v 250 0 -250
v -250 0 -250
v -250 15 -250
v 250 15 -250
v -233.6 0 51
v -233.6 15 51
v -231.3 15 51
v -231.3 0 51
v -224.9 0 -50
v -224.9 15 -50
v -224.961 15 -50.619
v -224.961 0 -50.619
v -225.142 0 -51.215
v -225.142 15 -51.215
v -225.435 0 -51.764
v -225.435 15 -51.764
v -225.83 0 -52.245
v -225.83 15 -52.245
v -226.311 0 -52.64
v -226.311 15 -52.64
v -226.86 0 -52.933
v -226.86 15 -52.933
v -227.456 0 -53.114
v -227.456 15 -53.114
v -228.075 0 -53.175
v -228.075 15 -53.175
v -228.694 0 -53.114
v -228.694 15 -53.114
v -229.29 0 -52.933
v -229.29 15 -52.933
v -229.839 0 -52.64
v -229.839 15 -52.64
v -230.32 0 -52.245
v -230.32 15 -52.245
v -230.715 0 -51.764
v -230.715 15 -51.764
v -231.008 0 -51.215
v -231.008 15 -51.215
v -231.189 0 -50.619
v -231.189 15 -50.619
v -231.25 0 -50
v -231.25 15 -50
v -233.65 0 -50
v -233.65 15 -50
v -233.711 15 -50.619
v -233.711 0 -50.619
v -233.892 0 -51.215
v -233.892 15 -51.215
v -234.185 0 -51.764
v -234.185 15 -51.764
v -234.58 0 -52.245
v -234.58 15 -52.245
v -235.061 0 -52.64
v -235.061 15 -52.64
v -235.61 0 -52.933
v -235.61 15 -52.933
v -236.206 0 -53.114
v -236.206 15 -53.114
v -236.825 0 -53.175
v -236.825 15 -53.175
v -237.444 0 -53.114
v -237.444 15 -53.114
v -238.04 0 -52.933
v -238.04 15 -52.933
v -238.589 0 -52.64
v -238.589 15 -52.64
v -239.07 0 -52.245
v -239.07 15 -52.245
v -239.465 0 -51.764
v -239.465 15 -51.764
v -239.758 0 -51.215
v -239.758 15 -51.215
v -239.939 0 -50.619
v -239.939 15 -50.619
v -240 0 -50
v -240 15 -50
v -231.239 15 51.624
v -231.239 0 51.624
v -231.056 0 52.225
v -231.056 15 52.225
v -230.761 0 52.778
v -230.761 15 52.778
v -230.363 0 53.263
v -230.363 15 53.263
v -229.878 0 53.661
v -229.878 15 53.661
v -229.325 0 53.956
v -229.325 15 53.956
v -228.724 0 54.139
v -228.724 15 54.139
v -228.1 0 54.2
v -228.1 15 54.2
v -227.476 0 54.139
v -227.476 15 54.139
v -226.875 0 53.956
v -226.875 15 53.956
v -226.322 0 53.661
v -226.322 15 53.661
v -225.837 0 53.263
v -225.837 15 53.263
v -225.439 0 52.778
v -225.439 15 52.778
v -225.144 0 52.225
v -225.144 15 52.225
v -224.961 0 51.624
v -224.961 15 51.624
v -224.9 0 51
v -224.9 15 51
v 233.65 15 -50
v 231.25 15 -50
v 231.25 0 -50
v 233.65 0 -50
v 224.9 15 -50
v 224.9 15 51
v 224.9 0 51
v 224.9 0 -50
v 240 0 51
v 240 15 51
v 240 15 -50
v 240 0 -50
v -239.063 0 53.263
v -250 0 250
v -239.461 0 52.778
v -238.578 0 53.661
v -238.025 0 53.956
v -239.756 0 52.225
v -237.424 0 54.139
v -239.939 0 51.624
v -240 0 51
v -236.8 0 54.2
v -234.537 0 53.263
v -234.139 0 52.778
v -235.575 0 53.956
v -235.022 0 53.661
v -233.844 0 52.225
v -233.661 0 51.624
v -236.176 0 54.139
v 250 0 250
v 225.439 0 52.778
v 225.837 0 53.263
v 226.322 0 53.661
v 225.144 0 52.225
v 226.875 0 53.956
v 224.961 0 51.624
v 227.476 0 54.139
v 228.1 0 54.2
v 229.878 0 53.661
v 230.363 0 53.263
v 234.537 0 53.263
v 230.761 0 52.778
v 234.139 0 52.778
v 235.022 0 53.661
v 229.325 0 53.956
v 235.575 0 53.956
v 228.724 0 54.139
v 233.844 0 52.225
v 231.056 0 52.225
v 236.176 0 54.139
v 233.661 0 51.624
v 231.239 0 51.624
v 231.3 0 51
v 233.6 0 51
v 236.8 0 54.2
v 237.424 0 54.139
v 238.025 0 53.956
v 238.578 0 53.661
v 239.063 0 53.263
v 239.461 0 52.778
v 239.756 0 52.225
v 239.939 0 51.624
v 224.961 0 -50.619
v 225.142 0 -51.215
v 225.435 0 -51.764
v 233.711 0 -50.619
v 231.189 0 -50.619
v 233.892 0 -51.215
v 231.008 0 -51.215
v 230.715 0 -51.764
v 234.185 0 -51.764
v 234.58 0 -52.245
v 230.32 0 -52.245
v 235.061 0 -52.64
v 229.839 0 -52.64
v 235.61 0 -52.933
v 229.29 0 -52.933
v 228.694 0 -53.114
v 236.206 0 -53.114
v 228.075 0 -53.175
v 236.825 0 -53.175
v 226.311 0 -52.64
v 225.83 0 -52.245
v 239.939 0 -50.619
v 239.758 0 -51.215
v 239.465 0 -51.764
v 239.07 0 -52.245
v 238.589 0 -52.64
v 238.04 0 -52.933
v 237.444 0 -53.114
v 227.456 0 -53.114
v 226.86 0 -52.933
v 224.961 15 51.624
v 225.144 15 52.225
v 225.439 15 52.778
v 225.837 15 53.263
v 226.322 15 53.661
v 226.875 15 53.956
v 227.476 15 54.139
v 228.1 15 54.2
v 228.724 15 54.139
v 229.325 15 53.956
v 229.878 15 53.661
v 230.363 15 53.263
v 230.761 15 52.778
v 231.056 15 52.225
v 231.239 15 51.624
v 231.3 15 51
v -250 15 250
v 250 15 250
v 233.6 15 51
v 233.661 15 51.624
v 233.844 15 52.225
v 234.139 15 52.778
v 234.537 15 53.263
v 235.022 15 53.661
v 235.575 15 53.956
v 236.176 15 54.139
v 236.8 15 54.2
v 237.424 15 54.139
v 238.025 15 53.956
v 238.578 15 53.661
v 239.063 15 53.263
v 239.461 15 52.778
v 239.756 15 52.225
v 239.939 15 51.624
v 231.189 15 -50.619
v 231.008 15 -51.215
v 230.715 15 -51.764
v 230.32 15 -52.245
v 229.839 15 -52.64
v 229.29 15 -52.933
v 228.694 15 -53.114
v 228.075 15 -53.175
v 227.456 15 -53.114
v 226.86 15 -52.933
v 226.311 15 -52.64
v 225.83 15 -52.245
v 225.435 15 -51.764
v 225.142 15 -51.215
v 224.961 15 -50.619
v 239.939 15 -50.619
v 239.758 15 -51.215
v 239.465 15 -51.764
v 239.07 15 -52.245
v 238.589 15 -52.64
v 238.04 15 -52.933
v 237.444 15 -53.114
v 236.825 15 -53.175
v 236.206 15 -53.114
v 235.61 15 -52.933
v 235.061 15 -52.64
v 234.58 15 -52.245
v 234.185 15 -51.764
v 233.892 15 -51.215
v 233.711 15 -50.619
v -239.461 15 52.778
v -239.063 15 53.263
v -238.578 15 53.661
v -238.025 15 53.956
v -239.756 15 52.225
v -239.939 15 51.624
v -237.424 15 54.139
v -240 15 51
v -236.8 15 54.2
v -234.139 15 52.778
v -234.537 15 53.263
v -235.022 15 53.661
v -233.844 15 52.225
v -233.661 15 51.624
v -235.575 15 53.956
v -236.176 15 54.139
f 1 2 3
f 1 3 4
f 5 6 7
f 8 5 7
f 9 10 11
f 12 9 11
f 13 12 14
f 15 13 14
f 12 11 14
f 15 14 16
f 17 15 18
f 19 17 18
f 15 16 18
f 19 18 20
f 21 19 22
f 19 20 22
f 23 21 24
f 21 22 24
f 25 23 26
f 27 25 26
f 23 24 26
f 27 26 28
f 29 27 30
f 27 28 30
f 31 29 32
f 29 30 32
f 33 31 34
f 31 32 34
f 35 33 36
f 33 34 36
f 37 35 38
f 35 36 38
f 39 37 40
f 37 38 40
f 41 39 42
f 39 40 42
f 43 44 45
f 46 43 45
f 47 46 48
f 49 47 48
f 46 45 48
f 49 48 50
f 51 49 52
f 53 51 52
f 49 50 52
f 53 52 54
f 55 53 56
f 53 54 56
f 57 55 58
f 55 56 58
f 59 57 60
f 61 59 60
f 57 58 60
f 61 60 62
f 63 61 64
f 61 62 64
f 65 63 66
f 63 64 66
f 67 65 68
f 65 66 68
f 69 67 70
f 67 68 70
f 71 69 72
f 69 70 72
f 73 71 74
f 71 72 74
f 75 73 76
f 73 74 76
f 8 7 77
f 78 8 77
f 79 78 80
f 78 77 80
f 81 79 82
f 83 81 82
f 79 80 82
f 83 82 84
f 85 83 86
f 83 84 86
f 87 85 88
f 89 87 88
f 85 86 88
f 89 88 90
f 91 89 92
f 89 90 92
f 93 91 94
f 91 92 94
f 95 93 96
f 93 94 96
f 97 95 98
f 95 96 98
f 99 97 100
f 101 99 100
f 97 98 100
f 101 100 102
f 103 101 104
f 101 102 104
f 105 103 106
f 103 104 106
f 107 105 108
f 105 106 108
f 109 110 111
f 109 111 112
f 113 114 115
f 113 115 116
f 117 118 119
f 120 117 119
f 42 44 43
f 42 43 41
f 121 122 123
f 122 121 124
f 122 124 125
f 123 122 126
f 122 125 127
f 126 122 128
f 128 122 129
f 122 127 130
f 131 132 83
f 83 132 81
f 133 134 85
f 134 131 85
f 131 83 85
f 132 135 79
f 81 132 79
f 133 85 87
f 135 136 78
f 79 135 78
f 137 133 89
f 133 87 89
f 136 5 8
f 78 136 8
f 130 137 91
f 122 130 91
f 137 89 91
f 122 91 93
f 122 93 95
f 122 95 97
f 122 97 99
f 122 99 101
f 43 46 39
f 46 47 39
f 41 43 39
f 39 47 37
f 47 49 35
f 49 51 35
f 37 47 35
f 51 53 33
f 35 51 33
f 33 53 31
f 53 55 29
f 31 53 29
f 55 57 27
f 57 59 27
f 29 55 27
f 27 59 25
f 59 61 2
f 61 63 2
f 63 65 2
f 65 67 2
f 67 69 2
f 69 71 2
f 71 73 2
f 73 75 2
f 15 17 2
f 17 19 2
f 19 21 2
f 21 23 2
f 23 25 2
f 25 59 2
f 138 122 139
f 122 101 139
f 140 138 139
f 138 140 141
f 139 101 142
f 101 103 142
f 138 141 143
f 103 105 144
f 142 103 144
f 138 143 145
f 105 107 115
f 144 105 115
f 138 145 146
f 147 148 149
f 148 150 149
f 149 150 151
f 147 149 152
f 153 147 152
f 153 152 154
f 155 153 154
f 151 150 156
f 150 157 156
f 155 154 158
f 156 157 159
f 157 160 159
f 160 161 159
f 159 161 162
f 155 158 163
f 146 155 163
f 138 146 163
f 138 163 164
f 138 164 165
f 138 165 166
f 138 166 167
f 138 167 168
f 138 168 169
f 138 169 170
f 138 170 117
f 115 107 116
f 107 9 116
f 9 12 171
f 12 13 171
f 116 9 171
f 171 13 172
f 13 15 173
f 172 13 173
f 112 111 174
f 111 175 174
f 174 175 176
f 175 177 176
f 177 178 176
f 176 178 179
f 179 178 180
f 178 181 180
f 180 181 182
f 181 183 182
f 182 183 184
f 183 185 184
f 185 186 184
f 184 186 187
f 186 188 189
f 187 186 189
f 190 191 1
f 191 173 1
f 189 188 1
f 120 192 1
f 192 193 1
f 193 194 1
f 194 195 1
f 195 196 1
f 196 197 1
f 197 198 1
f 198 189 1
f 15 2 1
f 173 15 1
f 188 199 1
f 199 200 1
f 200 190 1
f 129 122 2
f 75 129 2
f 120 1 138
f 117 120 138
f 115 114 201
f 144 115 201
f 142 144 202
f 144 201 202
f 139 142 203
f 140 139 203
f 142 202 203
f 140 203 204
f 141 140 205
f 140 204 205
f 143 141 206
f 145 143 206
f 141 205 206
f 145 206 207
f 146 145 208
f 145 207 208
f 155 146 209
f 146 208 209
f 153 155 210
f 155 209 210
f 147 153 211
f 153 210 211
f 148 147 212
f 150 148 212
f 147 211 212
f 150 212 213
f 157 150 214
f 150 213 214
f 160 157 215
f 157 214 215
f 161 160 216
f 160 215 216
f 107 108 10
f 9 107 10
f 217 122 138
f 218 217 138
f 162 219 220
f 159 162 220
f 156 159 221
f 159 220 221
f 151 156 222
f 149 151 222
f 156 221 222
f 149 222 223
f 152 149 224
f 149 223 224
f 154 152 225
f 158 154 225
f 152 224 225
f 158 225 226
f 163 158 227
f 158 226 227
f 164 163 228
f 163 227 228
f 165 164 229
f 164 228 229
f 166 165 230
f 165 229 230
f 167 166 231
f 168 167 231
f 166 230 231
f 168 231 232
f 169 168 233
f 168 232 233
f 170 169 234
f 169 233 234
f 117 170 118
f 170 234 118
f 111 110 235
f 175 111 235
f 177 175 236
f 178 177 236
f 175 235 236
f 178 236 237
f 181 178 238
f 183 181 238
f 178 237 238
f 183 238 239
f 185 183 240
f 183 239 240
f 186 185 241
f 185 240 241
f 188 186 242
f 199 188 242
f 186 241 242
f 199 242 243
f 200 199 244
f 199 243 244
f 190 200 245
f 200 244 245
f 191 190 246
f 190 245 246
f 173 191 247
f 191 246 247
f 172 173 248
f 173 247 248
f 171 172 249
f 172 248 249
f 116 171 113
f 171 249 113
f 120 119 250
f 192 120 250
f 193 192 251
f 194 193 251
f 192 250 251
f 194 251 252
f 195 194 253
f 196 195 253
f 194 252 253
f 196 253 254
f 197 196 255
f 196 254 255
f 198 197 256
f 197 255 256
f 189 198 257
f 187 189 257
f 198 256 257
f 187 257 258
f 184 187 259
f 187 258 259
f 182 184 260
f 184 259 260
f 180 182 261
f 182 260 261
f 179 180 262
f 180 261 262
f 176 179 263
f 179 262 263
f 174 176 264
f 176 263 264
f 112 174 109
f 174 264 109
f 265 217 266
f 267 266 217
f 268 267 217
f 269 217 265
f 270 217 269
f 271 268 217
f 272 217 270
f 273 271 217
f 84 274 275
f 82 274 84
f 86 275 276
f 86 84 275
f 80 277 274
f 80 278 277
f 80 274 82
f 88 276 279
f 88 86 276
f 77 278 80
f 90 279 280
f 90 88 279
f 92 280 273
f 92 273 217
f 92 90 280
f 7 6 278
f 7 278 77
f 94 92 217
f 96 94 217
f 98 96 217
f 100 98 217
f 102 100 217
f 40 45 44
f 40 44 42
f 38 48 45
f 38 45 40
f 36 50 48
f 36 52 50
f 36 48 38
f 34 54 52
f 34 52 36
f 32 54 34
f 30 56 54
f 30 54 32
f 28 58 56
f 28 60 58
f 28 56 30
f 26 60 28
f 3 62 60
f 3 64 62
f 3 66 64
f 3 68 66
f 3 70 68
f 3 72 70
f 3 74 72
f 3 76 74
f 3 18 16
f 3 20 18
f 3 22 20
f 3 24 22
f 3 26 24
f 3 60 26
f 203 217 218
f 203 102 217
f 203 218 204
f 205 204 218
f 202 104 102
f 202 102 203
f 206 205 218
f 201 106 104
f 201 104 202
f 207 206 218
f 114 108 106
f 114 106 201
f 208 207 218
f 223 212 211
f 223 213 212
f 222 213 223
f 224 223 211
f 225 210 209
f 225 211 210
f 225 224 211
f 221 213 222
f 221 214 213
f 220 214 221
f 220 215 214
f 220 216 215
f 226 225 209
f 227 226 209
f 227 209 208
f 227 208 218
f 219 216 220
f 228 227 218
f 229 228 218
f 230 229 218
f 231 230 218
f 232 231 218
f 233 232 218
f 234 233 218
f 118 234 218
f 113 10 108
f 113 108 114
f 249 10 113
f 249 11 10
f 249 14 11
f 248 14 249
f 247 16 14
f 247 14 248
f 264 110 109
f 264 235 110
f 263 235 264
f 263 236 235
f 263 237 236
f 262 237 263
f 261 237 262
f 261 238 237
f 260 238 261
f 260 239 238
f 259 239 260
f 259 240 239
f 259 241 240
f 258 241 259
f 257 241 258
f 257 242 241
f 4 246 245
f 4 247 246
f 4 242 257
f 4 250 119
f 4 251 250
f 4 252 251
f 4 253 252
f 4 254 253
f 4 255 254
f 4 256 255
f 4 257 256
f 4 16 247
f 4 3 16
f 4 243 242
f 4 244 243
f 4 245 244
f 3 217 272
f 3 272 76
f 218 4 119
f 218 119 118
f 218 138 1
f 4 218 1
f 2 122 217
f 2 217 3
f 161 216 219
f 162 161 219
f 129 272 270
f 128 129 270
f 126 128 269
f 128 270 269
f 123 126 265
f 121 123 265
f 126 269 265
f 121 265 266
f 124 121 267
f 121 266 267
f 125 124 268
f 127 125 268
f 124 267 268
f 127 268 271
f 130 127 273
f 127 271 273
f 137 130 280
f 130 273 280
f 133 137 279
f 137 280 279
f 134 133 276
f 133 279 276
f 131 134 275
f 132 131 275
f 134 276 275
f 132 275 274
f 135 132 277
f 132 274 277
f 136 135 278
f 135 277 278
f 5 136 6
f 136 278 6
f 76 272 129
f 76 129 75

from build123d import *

# Parameters (mm, degrees)
CROQUIS1_W              = 500
CROQUIS1_H              = 500
SALIENTE_EXTRUIR1_DEPTH = 15
CROQUIS3_W              = 15.1
CROQUIS3_H              = 101
CORTAR_EXTRUIR1_DEPTH   = 16
CROQUIS4_R              = 3.2
CROQUIS4_R_2            = 3.175
CORTAR_EXTRUIR2_DEPTH   = 16


with BuildPart() as part:
    # Croquis1 → Saliente-Extruir1 (new body)
    with BuildSketch(Plane(origin=(0, 0, 0), x_dir=(1, 0, 0), z_dir=(0, 1, 0))):
        Rectangle(CROQUIS1_W, CROQUIS1_H)
    extrude(amount=SALIENTE_EXTRUIR1_DEPTH)

    # Croquis3 → Cortar-Extruir1 (cut, through all)
    with BuildSketch(Plane(origin=(0, 15, 0), x_dir=(1, 0, 0), z_dir=(0, 1, 0))):
        with Locations((-232.45, -0.5)):
            Rectangle(CROQUIS3_W, CROQUIS3_H)
        with Locations((232.45, -0.5)):
            Rectangle(CROQUIS3_W, CROQUIS3_H)
    extrude(amount=-CORTAR_EXTRUIR1_DEPTH, mode=Mode.SUBTRACT)

    # Croquis4 → Cortar-Extruir2 (cut, through all)
    with BuildSketch(Plane(origin=(0, 15, 0), x_dir=(1, 0, 0), z_dir=(0, 1, 0))):
        with Locations((-228.1, -51)):
            Circle(CROQUIS4_R)
        with Locations((-236.8, -51)):
            Circle(CROQUIS4_R)
        with Locations((-228.075, 50)):
            Circle(CROQUIS4_R_2)
        with Locations((-236.825, 50)):
            Circle(CROQUIS4_R_2)
        with Locations((236.8, -51)):
            Circle(CROQUIS4_R)
        with Locations((228.1, -51)):
            Circle(CROQUIS4_R)
        with Locations((228.075, 50)):
            Circle(CROQUIS4_R_2)
        with Locations((236.825, 50)):
            Circle(CROQUIS4_R_2)
    extrude(amount=-CORTAR_EXTRUIR2_DEPTH, mode=Mode.SUBTRACT)


solid = part.part
